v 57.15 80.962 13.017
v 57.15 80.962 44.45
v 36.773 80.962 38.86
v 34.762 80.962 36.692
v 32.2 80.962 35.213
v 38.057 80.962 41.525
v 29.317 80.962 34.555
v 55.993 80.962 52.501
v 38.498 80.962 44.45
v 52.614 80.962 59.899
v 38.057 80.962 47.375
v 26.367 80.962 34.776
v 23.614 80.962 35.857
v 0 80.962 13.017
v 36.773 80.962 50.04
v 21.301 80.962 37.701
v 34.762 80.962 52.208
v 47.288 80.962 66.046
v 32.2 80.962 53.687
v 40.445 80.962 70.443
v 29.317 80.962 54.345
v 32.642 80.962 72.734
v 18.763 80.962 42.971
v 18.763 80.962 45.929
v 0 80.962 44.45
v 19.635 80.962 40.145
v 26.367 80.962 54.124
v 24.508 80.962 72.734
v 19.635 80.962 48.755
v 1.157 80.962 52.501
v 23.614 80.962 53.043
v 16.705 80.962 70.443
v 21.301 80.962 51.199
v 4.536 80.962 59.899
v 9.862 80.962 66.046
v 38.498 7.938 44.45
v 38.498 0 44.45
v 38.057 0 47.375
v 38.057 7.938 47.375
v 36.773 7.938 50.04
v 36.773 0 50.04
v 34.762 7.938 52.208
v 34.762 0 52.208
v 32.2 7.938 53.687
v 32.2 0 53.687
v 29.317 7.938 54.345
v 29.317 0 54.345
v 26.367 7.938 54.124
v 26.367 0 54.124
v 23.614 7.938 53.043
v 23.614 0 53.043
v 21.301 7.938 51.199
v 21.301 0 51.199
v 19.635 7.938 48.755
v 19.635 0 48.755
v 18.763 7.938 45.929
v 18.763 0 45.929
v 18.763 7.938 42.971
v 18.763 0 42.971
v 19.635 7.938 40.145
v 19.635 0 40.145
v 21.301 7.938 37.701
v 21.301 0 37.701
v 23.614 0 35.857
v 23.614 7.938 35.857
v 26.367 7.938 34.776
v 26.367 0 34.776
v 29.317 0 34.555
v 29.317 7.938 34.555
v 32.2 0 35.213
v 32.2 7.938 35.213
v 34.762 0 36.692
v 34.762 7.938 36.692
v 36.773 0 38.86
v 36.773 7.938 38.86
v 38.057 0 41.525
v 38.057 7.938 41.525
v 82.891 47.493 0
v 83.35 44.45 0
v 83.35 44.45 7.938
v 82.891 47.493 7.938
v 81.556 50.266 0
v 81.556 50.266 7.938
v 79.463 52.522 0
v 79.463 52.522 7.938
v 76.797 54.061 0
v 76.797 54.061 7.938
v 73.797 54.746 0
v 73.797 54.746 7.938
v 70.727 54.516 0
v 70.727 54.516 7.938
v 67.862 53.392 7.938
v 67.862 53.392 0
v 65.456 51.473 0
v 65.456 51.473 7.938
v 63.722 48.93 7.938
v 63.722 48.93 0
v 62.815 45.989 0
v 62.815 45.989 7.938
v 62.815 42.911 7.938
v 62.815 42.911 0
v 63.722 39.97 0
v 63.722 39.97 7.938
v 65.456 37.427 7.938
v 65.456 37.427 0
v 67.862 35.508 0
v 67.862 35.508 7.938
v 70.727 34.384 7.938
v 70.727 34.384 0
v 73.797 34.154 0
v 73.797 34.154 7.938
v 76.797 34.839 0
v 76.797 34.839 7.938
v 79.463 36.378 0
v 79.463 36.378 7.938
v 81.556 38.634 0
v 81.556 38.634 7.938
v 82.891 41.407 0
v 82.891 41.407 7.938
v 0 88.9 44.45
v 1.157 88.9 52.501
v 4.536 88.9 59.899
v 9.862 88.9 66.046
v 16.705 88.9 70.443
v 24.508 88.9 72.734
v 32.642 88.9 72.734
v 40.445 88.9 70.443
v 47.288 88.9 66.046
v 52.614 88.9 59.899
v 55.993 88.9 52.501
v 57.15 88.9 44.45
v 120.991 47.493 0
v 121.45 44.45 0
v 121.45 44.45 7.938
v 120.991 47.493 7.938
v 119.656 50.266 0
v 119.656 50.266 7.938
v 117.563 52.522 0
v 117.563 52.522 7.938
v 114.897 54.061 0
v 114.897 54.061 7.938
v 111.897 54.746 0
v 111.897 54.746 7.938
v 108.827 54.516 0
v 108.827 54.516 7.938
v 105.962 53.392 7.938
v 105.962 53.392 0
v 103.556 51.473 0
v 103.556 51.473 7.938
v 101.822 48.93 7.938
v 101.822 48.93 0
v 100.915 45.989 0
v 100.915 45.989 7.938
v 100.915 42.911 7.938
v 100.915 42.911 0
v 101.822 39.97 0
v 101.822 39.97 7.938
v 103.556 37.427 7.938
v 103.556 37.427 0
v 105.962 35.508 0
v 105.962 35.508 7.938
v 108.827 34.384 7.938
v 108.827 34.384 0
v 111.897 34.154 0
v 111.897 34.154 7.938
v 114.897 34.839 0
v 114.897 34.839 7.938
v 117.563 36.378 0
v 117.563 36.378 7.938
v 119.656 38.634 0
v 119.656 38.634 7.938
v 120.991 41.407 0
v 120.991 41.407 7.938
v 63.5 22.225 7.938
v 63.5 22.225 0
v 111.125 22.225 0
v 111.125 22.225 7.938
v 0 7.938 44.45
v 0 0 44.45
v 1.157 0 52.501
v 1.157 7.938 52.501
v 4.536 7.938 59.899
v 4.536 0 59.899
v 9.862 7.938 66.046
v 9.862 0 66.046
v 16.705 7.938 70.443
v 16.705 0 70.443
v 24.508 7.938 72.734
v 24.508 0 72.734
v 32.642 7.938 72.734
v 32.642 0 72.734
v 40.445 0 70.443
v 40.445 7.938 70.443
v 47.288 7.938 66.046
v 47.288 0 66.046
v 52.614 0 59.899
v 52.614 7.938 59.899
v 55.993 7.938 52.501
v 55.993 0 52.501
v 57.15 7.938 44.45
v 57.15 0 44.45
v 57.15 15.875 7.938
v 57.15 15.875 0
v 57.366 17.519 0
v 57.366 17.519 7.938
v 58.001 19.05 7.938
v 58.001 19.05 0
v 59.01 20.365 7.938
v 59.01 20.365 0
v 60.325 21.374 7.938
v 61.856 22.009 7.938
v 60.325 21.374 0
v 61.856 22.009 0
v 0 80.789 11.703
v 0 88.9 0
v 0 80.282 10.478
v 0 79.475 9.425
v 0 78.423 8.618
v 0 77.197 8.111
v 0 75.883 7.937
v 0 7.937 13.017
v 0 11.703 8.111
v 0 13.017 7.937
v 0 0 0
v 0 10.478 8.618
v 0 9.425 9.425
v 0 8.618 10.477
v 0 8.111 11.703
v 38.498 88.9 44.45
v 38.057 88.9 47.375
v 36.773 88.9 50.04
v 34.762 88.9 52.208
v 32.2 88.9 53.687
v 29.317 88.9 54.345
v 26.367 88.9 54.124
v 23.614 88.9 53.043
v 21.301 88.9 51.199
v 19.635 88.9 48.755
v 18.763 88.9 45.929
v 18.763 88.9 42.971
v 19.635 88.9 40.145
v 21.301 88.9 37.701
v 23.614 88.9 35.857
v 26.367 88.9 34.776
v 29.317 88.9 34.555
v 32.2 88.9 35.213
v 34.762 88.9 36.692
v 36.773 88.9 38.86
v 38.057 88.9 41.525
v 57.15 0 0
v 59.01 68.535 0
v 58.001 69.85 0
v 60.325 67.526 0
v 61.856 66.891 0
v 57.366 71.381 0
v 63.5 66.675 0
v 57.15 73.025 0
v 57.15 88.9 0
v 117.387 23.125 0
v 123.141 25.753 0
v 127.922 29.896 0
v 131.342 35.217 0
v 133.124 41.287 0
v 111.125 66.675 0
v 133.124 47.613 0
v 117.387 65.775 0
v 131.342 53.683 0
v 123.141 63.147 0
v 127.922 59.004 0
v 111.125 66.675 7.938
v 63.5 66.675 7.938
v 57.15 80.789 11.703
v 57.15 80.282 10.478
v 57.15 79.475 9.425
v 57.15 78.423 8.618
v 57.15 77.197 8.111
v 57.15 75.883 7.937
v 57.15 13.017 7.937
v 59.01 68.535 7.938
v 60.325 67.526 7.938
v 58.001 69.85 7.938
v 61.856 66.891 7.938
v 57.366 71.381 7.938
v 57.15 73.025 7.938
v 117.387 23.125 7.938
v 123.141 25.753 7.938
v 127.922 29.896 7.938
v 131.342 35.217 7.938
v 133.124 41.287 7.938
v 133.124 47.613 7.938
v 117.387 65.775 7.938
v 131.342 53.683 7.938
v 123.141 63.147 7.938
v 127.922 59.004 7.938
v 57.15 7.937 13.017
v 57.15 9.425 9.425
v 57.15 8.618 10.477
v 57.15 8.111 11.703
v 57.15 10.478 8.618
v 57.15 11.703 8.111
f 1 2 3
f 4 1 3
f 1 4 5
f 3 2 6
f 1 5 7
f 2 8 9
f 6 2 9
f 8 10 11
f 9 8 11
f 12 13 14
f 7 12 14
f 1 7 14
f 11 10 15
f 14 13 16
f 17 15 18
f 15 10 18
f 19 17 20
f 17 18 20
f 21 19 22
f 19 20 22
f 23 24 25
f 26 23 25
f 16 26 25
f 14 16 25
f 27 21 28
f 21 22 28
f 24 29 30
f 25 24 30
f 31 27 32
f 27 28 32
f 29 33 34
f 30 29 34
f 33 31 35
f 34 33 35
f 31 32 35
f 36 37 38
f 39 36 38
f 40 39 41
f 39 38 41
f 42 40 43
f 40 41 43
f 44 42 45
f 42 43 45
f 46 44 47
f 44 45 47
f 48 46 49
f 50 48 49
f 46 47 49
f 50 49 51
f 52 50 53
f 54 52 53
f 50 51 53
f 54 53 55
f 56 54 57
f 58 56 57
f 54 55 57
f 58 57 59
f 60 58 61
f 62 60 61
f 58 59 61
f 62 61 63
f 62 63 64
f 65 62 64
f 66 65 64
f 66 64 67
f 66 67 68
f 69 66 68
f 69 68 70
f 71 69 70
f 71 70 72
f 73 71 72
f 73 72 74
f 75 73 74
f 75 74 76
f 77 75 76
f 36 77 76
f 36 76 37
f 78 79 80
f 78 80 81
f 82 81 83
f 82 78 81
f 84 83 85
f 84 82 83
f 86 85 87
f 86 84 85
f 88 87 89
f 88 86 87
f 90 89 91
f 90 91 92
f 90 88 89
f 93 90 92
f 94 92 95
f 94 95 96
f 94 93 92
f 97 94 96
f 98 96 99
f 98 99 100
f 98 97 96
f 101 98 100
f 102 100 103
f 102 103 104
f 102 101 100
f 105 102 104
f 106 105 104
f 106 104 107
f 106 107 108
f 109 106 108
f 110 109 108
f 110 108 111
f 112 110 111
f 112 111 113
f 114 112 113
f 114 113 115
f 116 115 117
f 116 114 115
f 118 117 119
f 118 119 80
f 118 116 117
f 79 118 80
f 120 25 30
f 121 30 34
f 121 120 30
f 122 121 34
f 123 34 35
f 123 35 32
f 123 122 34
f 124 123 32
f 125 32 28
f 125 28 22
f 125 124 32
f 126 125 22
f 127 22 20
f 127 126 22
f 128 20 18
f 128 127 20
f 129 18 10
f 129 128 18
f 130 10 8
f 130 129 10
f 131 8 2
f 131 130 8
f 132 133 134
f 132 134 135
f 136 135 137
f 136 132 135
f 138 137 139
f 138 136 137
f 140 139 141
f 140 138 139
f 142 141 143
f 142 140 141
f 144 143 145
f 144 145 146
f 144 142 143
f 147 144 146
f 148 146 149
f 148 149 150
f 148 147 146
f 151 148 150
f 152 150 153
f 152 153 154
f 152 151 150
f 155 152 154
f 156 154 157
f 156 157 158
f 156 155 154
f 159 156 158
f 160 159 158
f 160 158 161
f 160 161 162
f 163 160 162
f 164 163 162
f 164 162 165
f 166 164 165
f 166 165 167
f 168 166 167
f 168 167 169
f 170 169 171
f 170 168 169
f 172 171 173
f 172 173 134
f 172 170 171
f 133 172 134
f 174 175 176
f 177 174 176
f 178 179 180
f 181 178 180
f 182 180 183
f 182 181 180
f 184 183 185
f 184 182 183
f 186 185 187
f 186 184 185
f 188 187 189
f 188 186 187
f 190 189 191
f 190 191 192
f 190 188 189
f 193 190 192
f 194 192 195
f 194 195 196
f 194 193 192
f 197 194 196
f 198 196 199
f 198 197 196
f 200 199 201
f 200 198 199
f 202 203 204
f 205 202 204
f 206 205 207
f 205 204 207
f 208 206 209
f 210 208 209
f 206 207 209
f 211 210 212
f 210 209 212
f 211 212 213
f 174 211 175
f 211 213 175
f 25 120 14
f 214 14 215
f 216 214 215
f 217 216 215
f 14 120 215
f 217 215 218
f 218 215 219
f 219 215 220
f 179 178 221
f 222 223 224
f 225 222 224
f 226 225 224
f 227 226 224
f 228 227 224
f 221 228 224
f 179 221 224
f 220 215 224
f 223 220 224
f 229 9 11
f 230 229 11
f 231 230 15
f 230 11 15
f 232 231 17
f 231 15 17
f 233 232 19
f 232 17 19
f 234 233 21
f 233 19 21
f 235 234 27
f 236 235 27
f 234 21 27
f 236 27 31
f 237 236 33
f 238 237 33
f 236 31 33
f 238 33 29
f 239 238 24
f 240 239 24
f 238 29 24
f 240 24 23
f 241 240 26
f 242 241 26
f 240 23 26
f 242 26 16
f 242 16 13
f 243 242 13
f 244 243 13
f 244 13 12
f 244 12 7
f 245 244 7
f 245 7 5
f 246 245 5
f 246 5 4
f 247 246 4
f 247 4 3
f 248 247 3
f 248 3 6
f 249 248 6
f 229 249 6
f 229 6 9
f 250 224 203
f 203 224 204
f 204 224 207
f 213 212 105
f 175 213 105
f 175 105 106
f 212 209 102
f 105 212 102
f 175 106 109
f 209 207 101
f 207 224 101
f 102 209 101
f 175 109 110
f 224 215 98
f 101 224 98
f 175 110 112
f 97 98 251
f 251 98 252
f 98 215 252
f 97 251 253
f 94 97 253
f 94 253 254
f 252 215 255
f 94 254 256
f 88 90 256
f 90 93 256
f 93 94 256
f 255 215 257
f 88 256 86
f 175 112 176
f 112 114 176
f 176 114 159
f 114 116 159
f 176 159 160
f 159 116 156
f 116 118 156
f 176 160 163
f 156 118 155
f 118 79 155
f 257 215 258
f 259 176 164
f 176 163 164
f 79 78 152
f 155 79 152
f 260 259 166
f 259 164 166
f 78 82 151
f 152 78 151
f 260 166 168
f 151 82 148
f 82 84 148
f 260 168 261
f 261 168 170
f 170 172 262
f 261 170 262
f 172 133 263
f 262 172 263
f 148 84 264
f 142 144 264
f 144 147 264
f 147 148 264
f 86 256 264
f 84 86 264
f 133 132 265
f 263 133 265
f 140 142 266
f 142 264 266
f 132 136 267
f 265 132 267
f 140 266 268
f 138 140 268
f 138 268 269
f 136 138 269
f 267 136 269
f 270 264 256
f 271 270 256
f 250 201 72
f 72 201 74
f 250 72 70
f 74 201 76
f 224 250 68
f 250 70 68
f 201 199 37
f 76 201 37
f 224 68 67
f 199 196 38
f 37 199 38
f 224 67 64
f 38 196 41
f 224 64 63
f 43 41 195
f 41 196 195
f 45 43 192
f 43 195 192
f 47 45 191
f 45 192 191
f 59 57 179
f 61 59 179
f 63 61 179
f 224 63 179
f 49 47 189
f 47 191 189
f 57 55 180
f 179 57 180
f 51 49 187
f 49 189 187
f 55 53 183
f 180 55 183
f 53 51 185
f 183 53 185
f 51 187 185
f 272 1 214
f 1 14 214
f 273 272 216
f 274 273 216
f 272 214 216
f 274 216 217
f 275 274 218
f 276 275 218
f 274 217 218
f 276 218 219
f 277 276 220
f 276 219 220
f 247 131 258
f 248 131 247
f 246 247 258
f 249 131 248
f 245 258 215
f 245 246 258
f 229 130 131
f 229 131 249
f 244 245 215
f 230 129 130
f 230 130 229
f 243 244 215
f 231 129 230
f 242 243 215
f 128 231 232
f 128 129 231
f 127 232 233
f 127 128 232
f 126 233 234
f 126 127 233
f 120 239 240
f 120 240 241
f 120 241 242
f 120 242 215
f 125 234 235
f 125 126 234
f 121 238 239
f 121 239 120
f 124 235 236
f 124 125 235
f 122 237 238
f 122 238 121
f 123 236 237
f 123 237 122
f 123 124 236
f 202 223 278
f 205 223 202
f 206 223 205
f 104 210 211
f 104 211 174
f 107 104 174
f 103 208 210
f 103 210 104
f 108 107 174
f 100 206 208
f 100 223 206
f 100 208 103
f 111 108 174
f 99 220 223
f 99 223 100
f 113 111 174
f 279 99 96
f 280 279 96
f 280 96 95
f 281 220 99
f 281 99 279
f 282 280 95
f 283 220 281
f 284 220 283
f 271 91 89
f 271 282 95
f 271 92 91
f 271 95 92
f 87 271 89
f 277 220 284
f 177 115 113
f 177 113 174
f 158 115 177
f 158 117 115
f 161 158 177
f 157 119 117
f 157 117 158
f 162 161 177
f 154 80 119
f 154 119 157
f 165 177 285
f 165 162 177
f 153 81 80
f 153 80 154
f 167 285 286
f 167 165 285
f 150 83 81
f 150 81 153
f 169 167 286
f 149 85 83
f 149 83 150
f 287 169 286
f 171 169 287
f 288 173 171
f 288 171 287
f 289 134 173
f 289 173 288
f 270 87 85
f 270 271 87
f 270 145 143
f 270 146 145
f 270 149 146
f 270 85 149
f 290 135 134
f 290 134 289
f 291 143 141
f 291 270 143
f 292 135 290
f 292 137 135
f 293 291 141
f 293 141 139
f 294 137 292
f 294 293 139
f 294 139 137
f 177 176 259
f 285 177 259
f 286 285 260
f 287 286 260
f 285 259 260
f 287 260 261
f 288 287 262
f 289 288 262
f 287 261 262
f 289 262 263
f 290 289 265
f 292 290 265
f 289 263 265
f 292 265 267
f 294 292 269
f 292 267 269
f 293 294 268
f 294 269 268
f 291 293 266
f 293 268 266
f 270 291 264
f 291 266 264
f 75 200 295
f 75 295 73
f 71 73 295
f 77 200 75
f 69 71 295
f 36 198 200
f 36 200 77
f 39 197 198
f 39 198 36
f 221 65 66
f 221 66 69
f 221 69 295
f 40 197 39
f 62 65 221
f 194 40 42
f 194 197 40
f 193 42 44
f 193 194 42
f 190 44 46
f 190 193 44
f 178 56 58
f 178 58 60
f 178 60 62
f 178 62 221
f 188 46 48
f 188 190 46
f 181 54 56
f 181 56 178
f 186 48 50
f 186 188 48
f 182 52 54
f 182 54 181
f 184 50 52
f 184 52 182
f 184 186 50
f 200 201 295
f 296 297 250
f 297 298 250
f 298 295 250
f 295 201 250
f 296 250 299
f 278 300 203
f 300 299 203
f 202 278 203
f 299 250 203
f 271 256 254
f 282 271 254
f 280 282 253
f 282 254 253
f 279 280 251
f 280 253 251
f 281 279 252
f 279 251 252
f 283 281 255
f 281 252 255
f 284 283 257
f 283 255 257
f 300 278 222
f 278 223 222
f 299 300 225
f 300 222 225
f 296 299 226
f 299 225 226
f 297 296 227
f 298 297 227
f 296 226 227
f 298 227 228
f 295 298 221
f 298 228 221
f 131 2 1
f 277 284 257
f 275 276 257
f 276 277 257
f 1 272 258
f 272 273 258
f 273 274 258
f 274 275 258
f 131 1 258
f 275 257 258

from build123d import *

# Parameters (mm, degrees)
F0_W     = 57.15
F0_H     = 7.9375
F0_R     = 10.3251
F1_DEPTH = 7.9375
F2_DEPTH = 44.45
F3_DEPTH = 44.45
F4_W     = 28.575
F4_H     = 7.9375
F6_W     = 28.575
F6_H     = 7.9375
F8_R     = 9.92251
F9_DEPTH = 88.901
F10_R    = 5.08


with BuildPart() as f1:
    # F0 (on Top) → F1 (new body)
    with BuildSketch(Plane.XY):
        with Locations((28.575, 3.96875)):
            Rectangle(F0_W, F0_H)
        with BuildLine():
            Line((0, 80.9625), (0, 7.9375))
            Line((0, 7.9375), (57.15, 7.9375))
            Line((57.15, 7.9375), (57.15, 15.875))
            ThreePointArc((57.15, 15.875), (59.009872, 20.365128), (63.5, 22.225))
            Line((63.5, 22.225), (111.125, 22.225))
            ThreePointArc((111.125, 22.225), (133.35, 44.45), (111.125, 66.675))
            Line((111.125, 66.675), (63.5, 66.675))
            ThreePointArc((63.5, 66.675), (59.009872, 68.534872), (57.15, 73.025))
            Line((57.15, 73.025), (57.15, 80.9625))
            Line((57.15, 80.9625), (0, 80.9625))
        make_face()
        with Locations((73.025, 44.45)):
            Circle(F0_R, mode=Mode.SUBTRACT)
        with Locations((111.125, 44.45)):
            Circle(F0_R, mode=Mode.SUBTRACT)
        with Locations((28.575, 84.93125)):
            Rectangle(F0_W, F0_H)
    extrude(amount=F1_DEPTH)

    # F0 (on Top) → F2 (join)
    with BuildSketch(Plane.XY):
        with Locations((28.575, 3.96875)):
            Rectangle(F0_W, F0_H)
    extrude(amount=F2_DEPTH)

    # F0 (on Top) → F3 (join)
    with BuildSketch(Plane.XY):
        with Locations((28.575, 84.93125)):
            Rectangle(F0_W, F0_H)
    extrude(amount=F3_DEPTH)

    # F4 (on face) → F5 (revolve)
    with BuildSketch(Plane.XY.offset(44.45)):
        with Locations((14.2875, 3.96875)):
            Rectangle(F4_W, F4_H)
    revolve(axis=Axis((28.575, 3.96875, 44.45), (0, 1, 0)))

    # F6 (on face) → F7 (revolve)
    with BuildSketch(Plane.XY.offset(44.45)):
        with Locations((14.2875, 84.93125)):
            Rectangle(F6_W, F6_H)
    revolve(axis=Axis((28.575, 84.93125, 44.45), (0, 1, 0)))

    # F8 (on face) → F9 (cut, through all)
    with BuildSketch(Plane.XZ):
        with Locations((28.575, 44.45)):
            Circle(F8_R)
    extrude(amount=-F9_DEPTH, mode=Mode.SUBTRACT)

    # F10
    f10_edges = [f1.edges().sort_by_distance(p)[0] for p in [
        (28.575, 80.9625, 7.9375),
        (28.575, 7.9375, 7.9375),
    ]]
    fillet(f10_edges, radius=F10_R)


solid = f1.part
